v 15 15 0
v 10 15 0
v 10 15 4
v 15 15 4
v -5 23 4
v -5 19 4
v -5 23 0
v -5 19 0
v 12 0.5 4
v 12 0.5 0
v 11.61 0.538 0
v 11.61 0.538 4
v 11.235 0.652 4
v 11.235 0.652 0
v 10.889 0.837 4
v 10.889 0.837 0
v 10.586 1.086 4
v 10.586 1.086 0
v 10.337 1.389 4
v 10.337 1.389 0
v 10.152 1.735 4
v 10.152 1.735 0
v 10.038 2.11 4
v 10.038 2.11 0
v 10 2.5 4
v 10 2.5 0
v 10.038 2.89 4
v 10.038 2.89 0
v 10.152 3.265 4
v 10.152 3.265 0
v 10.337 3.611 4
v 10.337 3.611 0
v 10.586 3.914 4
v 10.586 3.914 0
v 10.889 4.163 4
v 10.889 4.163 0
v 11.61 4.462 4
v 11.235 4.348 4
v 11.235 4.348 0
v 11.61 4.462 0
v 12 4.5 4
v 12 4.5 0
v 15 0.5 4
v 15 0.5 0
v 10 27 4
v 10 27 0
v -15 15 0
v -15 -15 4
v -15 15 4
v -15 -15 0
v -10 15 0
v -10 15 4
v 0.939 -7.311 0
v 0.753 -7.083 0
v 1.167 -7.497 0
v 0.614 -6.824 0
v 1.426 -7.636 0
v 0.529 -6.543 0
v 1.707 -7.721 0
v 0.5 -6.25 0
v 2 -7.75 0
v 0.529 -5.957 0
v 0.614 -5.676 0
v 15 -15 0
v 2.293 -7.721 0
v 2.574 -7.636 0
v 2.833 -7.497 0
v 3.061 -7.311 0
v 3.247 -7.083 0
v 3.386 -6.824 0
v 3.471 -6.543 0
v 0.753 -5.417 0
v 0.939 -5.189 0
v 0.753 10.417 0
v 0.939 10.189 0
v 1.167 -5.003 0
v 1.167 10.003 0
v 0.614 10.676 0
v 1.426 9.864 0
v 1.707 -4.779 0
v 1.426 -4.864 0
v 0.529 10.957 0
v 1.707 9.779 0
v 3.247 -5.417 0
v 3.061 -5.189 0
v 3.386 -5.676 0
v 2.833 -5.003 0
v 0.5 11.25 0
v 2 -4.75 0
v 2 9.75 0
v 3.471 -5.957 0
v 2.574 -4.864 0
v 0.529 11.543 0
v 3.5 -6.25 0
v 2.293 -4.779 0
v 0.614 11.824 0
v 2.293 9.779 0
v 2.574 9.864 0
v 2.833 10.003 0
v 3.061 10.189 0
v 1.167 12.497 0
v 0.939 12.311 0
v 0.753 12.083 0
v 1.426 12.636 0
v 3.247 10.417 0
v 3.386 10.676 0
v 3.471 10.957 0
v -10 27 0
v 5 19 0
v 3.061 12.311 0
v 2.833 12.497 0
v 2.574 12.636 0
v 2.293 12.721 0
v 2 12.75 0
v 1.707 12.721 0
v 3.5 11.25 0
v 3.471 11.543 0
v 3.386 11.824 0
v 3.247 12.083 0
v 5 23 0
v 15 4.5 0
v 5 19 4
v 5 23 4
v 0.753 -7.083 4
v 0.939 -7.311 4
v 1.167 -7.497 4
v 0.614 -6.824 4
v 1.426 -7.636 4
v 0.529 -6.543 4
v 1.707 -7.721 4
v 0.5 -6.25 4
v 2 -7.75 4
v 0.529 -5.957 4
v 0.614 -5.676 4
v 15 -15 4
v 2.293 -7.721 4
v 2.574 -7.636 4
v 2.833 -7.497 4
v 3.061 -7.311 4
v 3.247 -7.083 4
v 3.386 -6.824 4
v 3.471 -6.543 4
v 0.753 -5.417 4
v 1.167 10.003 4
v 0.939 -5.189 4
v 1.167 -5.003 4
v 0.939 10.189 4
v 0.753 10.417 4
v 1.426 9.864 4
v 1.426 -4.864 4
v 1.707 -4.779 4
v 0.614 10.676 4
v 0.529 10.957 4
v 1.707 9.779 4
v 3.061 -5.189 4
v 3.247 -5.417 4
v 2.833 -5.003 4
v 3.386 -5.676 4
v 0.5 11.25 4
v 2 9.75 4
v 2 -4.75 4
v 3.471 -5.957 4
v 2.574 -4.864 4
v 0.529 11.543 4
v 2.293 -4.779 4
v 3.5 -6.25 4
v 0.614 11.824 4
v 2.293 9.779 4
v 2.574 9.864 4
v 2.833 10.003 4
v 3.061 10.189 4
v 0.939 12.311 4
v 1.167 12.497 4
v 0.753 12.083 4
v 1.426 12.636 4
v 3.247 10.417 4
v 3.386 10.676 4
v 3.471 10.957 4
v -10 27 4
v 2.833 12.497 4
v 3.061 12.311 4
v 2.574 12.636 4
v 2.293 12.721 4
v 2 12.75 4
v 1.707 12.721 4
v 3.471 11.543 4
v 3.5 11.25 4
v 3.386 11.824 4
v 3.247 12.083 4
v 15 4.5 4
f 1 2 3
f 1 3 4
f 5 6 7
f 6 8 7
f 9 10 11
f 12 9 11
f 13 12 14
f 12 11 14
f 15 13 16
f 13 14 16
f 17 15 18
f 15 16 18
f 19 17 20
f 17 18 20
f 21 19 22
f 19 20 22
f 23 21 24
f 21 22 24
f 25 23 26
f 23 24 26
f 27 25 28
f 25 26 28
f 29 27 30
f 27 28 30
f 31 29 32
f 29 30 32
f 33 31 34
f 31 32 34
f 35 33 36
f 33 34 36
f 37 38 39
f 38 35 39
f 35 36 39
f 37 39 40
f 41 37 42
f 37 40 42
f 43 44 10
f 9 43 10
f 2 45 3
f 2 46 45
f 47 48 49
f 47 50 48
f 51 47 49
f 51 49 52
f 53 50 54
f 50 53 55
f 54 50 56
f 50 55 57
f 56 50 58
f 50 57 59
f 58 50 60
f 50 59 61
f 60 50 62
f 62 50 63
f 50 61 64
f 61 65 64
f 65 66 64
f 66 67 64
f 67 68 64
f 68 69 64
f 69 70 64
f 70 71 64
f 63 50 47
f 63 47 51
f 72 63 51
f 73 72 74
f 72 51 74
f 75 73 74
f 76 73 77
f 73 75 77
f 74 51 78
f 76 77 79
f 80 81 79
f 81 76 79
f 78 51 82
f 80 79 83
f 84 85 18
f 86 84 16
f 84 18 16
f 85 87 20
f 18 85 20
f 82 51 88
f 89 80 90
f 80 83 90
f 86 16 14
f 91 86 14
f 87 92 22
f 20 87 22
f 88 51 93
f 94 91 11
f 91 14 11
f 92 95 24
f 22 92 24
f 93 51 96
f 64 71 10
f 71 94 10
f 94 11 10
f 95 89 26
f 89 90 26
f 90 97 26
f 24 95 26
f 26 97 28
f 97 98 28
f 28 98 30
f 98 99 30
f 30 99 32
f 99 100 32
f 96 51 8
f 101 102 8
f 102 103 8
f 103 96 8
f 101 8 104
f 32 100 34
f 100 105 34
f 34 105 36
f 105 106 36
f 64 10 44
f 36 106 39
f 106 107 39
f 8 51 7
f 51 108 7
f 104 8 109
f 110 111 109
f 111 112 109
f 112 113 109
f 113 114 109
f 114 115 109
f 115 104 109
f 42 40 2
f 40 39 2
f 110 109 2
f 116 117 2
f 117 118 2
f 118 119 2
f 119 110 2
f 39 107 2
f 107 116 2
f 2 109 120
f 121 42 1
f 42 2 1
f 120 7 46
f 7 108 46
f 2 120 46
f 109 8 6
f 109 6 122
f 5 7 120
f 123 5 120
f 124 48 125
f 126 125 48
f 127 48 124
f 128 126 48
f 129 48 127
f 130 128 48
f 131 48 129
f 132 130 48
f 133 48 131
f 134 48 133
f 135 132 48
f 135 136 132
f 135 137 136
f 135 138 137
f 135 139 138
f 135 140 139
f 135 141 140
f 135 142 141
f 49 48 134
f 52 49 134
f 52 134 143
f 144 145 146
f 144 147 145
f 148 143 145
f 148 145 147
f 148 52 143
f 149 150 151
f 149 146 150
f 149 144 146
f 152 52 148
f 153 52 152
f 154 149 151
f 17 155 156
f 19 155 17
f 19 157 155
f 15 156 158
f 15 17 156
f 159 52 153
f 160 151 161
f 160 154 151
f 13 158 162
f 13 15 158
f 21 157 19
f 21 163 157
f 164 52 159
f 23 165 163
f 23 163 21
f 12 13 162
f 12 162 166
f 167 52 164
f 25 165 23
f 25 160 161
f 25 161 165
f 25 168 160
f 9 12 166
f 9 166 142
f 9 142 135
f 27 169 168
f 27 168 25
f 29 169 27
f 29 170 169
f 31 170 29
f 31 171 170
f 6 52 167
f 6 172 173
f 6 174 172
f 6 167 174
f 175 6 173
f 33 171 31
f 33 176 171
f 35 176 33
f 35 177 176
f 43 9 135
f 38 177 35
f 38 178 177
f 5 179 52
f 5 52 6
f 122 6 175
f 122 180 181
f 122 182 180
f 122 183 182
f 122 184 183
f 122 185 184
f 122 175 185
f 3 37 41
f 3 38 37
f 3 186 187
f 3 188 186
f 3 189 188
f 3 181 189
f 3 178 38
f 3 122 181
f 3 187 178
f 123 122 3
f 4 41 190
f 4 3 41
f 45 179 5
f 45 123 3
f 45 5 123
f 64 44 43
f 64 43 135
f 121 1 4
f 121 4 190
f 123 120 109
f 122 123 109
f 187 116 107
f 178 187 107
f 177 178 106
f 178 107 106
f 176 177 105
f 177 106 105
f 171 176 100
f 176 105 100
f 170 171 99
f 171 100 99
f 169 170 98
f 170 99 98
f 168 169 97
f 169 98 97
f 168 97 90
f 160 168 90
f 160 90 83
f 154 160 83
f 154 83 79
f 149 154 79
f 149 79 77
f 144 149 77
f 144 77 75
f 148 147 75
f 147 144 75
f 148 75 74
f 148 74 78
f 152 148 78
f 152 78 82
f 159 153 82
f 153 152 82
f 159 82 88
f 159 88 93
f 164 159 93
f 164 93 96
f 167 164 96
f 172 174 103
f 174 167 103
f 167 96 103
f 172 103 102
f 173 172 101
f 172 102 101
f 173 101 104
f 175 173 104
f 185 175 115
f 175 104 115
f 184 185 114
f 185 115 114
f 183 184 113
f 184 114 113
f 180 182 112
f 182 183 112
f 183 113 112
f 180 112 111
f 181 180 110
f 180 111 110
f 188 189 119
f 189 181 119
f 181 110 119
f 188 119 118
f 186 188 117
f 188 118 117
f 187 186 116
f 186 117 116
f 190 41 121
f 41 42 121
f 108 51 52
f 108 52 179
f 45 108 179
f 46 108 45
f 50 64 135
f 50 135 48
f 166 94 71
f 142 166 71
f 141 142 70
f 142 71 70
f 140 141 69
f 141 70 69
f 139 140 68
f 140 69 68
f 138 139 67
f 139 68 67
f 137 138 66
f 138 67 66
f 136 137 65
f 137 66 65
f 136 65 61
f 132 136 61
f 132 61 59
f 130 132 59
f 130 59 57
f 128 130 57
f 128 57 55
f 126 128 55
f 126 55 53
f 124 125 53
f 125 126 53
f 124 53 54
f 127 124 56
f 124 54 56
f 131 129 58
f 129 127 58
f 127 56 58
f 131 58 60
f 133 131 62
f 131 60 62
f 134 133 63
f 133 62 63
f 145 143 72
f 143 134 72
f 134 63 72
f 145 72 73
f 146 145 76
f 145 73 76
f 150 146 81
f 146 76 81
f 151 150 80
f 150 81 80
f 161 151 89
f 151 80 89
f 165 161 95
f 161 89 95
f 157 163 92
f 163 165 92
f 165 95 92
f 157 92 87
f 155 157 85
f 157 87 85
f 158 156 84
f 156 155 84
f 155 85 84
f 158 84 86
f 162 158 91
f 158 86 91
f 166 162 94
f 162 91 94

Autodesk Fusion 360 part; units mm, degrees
sketch "Sketch1" plane through (0, 0, 0) normal (0, 0, 1) x (1, 0, 0)
  line L0 (15, -15) -> (-15, -15)
  line L1 (-15, -15) -> (-15, 15)
  line L2 (-10, 15) -> (-10, 27)
  line L3 (-10, 27) -> (10, 27)
  line L4 (10, 27) -> (10, 15)
  line L5 (-5, 19) -> (-5, 23)
  line L6 (-5, 23) -> (5, 23)
  line L7 (5, 23) -> (5, 19)
  line L8 (-15, 15) -> (-10, 15)
  line L9 (10, 15) -> (15, 15)
  line L10 (0, 70) -> (0, -30) construction
  line L11 (15, 0.5) -> (12, 0.5)
  line L12 (12, 4.5) -> (15, 4.5)
  arc A0 (12, 4.5) -> (12, 0.5) centre (12, 2.5) ccw
  line L13 (15, 15) -> (15, 4.5)
  line L14 (15, 0.5) -> (15, -15)
  circle A1 centre (2, 11.25) radius 1.5
  circle A2 centre (2, -6.25) radius 1.5
  line L15 (-5, 19) -> (5, 19)
  dimension "d1" = 30
  dimension "d3" = 12
  dimension "d4" = 20
  dimension "d7" = 4
  dimension "d8" = 10
  dimension "d9" = 42
  dimension "d17" = 12.5
  dimension "d18" = 2
  dimension "d21" = 17.5
  dimension "d22" = 3
  dimension "d23" = 3
  dimension "d24" = 10
  dimension "d25" = 3
  dimension "d29" = 4
extrude "Extrude1" add sketch "Sketch1" along normal blind 4
